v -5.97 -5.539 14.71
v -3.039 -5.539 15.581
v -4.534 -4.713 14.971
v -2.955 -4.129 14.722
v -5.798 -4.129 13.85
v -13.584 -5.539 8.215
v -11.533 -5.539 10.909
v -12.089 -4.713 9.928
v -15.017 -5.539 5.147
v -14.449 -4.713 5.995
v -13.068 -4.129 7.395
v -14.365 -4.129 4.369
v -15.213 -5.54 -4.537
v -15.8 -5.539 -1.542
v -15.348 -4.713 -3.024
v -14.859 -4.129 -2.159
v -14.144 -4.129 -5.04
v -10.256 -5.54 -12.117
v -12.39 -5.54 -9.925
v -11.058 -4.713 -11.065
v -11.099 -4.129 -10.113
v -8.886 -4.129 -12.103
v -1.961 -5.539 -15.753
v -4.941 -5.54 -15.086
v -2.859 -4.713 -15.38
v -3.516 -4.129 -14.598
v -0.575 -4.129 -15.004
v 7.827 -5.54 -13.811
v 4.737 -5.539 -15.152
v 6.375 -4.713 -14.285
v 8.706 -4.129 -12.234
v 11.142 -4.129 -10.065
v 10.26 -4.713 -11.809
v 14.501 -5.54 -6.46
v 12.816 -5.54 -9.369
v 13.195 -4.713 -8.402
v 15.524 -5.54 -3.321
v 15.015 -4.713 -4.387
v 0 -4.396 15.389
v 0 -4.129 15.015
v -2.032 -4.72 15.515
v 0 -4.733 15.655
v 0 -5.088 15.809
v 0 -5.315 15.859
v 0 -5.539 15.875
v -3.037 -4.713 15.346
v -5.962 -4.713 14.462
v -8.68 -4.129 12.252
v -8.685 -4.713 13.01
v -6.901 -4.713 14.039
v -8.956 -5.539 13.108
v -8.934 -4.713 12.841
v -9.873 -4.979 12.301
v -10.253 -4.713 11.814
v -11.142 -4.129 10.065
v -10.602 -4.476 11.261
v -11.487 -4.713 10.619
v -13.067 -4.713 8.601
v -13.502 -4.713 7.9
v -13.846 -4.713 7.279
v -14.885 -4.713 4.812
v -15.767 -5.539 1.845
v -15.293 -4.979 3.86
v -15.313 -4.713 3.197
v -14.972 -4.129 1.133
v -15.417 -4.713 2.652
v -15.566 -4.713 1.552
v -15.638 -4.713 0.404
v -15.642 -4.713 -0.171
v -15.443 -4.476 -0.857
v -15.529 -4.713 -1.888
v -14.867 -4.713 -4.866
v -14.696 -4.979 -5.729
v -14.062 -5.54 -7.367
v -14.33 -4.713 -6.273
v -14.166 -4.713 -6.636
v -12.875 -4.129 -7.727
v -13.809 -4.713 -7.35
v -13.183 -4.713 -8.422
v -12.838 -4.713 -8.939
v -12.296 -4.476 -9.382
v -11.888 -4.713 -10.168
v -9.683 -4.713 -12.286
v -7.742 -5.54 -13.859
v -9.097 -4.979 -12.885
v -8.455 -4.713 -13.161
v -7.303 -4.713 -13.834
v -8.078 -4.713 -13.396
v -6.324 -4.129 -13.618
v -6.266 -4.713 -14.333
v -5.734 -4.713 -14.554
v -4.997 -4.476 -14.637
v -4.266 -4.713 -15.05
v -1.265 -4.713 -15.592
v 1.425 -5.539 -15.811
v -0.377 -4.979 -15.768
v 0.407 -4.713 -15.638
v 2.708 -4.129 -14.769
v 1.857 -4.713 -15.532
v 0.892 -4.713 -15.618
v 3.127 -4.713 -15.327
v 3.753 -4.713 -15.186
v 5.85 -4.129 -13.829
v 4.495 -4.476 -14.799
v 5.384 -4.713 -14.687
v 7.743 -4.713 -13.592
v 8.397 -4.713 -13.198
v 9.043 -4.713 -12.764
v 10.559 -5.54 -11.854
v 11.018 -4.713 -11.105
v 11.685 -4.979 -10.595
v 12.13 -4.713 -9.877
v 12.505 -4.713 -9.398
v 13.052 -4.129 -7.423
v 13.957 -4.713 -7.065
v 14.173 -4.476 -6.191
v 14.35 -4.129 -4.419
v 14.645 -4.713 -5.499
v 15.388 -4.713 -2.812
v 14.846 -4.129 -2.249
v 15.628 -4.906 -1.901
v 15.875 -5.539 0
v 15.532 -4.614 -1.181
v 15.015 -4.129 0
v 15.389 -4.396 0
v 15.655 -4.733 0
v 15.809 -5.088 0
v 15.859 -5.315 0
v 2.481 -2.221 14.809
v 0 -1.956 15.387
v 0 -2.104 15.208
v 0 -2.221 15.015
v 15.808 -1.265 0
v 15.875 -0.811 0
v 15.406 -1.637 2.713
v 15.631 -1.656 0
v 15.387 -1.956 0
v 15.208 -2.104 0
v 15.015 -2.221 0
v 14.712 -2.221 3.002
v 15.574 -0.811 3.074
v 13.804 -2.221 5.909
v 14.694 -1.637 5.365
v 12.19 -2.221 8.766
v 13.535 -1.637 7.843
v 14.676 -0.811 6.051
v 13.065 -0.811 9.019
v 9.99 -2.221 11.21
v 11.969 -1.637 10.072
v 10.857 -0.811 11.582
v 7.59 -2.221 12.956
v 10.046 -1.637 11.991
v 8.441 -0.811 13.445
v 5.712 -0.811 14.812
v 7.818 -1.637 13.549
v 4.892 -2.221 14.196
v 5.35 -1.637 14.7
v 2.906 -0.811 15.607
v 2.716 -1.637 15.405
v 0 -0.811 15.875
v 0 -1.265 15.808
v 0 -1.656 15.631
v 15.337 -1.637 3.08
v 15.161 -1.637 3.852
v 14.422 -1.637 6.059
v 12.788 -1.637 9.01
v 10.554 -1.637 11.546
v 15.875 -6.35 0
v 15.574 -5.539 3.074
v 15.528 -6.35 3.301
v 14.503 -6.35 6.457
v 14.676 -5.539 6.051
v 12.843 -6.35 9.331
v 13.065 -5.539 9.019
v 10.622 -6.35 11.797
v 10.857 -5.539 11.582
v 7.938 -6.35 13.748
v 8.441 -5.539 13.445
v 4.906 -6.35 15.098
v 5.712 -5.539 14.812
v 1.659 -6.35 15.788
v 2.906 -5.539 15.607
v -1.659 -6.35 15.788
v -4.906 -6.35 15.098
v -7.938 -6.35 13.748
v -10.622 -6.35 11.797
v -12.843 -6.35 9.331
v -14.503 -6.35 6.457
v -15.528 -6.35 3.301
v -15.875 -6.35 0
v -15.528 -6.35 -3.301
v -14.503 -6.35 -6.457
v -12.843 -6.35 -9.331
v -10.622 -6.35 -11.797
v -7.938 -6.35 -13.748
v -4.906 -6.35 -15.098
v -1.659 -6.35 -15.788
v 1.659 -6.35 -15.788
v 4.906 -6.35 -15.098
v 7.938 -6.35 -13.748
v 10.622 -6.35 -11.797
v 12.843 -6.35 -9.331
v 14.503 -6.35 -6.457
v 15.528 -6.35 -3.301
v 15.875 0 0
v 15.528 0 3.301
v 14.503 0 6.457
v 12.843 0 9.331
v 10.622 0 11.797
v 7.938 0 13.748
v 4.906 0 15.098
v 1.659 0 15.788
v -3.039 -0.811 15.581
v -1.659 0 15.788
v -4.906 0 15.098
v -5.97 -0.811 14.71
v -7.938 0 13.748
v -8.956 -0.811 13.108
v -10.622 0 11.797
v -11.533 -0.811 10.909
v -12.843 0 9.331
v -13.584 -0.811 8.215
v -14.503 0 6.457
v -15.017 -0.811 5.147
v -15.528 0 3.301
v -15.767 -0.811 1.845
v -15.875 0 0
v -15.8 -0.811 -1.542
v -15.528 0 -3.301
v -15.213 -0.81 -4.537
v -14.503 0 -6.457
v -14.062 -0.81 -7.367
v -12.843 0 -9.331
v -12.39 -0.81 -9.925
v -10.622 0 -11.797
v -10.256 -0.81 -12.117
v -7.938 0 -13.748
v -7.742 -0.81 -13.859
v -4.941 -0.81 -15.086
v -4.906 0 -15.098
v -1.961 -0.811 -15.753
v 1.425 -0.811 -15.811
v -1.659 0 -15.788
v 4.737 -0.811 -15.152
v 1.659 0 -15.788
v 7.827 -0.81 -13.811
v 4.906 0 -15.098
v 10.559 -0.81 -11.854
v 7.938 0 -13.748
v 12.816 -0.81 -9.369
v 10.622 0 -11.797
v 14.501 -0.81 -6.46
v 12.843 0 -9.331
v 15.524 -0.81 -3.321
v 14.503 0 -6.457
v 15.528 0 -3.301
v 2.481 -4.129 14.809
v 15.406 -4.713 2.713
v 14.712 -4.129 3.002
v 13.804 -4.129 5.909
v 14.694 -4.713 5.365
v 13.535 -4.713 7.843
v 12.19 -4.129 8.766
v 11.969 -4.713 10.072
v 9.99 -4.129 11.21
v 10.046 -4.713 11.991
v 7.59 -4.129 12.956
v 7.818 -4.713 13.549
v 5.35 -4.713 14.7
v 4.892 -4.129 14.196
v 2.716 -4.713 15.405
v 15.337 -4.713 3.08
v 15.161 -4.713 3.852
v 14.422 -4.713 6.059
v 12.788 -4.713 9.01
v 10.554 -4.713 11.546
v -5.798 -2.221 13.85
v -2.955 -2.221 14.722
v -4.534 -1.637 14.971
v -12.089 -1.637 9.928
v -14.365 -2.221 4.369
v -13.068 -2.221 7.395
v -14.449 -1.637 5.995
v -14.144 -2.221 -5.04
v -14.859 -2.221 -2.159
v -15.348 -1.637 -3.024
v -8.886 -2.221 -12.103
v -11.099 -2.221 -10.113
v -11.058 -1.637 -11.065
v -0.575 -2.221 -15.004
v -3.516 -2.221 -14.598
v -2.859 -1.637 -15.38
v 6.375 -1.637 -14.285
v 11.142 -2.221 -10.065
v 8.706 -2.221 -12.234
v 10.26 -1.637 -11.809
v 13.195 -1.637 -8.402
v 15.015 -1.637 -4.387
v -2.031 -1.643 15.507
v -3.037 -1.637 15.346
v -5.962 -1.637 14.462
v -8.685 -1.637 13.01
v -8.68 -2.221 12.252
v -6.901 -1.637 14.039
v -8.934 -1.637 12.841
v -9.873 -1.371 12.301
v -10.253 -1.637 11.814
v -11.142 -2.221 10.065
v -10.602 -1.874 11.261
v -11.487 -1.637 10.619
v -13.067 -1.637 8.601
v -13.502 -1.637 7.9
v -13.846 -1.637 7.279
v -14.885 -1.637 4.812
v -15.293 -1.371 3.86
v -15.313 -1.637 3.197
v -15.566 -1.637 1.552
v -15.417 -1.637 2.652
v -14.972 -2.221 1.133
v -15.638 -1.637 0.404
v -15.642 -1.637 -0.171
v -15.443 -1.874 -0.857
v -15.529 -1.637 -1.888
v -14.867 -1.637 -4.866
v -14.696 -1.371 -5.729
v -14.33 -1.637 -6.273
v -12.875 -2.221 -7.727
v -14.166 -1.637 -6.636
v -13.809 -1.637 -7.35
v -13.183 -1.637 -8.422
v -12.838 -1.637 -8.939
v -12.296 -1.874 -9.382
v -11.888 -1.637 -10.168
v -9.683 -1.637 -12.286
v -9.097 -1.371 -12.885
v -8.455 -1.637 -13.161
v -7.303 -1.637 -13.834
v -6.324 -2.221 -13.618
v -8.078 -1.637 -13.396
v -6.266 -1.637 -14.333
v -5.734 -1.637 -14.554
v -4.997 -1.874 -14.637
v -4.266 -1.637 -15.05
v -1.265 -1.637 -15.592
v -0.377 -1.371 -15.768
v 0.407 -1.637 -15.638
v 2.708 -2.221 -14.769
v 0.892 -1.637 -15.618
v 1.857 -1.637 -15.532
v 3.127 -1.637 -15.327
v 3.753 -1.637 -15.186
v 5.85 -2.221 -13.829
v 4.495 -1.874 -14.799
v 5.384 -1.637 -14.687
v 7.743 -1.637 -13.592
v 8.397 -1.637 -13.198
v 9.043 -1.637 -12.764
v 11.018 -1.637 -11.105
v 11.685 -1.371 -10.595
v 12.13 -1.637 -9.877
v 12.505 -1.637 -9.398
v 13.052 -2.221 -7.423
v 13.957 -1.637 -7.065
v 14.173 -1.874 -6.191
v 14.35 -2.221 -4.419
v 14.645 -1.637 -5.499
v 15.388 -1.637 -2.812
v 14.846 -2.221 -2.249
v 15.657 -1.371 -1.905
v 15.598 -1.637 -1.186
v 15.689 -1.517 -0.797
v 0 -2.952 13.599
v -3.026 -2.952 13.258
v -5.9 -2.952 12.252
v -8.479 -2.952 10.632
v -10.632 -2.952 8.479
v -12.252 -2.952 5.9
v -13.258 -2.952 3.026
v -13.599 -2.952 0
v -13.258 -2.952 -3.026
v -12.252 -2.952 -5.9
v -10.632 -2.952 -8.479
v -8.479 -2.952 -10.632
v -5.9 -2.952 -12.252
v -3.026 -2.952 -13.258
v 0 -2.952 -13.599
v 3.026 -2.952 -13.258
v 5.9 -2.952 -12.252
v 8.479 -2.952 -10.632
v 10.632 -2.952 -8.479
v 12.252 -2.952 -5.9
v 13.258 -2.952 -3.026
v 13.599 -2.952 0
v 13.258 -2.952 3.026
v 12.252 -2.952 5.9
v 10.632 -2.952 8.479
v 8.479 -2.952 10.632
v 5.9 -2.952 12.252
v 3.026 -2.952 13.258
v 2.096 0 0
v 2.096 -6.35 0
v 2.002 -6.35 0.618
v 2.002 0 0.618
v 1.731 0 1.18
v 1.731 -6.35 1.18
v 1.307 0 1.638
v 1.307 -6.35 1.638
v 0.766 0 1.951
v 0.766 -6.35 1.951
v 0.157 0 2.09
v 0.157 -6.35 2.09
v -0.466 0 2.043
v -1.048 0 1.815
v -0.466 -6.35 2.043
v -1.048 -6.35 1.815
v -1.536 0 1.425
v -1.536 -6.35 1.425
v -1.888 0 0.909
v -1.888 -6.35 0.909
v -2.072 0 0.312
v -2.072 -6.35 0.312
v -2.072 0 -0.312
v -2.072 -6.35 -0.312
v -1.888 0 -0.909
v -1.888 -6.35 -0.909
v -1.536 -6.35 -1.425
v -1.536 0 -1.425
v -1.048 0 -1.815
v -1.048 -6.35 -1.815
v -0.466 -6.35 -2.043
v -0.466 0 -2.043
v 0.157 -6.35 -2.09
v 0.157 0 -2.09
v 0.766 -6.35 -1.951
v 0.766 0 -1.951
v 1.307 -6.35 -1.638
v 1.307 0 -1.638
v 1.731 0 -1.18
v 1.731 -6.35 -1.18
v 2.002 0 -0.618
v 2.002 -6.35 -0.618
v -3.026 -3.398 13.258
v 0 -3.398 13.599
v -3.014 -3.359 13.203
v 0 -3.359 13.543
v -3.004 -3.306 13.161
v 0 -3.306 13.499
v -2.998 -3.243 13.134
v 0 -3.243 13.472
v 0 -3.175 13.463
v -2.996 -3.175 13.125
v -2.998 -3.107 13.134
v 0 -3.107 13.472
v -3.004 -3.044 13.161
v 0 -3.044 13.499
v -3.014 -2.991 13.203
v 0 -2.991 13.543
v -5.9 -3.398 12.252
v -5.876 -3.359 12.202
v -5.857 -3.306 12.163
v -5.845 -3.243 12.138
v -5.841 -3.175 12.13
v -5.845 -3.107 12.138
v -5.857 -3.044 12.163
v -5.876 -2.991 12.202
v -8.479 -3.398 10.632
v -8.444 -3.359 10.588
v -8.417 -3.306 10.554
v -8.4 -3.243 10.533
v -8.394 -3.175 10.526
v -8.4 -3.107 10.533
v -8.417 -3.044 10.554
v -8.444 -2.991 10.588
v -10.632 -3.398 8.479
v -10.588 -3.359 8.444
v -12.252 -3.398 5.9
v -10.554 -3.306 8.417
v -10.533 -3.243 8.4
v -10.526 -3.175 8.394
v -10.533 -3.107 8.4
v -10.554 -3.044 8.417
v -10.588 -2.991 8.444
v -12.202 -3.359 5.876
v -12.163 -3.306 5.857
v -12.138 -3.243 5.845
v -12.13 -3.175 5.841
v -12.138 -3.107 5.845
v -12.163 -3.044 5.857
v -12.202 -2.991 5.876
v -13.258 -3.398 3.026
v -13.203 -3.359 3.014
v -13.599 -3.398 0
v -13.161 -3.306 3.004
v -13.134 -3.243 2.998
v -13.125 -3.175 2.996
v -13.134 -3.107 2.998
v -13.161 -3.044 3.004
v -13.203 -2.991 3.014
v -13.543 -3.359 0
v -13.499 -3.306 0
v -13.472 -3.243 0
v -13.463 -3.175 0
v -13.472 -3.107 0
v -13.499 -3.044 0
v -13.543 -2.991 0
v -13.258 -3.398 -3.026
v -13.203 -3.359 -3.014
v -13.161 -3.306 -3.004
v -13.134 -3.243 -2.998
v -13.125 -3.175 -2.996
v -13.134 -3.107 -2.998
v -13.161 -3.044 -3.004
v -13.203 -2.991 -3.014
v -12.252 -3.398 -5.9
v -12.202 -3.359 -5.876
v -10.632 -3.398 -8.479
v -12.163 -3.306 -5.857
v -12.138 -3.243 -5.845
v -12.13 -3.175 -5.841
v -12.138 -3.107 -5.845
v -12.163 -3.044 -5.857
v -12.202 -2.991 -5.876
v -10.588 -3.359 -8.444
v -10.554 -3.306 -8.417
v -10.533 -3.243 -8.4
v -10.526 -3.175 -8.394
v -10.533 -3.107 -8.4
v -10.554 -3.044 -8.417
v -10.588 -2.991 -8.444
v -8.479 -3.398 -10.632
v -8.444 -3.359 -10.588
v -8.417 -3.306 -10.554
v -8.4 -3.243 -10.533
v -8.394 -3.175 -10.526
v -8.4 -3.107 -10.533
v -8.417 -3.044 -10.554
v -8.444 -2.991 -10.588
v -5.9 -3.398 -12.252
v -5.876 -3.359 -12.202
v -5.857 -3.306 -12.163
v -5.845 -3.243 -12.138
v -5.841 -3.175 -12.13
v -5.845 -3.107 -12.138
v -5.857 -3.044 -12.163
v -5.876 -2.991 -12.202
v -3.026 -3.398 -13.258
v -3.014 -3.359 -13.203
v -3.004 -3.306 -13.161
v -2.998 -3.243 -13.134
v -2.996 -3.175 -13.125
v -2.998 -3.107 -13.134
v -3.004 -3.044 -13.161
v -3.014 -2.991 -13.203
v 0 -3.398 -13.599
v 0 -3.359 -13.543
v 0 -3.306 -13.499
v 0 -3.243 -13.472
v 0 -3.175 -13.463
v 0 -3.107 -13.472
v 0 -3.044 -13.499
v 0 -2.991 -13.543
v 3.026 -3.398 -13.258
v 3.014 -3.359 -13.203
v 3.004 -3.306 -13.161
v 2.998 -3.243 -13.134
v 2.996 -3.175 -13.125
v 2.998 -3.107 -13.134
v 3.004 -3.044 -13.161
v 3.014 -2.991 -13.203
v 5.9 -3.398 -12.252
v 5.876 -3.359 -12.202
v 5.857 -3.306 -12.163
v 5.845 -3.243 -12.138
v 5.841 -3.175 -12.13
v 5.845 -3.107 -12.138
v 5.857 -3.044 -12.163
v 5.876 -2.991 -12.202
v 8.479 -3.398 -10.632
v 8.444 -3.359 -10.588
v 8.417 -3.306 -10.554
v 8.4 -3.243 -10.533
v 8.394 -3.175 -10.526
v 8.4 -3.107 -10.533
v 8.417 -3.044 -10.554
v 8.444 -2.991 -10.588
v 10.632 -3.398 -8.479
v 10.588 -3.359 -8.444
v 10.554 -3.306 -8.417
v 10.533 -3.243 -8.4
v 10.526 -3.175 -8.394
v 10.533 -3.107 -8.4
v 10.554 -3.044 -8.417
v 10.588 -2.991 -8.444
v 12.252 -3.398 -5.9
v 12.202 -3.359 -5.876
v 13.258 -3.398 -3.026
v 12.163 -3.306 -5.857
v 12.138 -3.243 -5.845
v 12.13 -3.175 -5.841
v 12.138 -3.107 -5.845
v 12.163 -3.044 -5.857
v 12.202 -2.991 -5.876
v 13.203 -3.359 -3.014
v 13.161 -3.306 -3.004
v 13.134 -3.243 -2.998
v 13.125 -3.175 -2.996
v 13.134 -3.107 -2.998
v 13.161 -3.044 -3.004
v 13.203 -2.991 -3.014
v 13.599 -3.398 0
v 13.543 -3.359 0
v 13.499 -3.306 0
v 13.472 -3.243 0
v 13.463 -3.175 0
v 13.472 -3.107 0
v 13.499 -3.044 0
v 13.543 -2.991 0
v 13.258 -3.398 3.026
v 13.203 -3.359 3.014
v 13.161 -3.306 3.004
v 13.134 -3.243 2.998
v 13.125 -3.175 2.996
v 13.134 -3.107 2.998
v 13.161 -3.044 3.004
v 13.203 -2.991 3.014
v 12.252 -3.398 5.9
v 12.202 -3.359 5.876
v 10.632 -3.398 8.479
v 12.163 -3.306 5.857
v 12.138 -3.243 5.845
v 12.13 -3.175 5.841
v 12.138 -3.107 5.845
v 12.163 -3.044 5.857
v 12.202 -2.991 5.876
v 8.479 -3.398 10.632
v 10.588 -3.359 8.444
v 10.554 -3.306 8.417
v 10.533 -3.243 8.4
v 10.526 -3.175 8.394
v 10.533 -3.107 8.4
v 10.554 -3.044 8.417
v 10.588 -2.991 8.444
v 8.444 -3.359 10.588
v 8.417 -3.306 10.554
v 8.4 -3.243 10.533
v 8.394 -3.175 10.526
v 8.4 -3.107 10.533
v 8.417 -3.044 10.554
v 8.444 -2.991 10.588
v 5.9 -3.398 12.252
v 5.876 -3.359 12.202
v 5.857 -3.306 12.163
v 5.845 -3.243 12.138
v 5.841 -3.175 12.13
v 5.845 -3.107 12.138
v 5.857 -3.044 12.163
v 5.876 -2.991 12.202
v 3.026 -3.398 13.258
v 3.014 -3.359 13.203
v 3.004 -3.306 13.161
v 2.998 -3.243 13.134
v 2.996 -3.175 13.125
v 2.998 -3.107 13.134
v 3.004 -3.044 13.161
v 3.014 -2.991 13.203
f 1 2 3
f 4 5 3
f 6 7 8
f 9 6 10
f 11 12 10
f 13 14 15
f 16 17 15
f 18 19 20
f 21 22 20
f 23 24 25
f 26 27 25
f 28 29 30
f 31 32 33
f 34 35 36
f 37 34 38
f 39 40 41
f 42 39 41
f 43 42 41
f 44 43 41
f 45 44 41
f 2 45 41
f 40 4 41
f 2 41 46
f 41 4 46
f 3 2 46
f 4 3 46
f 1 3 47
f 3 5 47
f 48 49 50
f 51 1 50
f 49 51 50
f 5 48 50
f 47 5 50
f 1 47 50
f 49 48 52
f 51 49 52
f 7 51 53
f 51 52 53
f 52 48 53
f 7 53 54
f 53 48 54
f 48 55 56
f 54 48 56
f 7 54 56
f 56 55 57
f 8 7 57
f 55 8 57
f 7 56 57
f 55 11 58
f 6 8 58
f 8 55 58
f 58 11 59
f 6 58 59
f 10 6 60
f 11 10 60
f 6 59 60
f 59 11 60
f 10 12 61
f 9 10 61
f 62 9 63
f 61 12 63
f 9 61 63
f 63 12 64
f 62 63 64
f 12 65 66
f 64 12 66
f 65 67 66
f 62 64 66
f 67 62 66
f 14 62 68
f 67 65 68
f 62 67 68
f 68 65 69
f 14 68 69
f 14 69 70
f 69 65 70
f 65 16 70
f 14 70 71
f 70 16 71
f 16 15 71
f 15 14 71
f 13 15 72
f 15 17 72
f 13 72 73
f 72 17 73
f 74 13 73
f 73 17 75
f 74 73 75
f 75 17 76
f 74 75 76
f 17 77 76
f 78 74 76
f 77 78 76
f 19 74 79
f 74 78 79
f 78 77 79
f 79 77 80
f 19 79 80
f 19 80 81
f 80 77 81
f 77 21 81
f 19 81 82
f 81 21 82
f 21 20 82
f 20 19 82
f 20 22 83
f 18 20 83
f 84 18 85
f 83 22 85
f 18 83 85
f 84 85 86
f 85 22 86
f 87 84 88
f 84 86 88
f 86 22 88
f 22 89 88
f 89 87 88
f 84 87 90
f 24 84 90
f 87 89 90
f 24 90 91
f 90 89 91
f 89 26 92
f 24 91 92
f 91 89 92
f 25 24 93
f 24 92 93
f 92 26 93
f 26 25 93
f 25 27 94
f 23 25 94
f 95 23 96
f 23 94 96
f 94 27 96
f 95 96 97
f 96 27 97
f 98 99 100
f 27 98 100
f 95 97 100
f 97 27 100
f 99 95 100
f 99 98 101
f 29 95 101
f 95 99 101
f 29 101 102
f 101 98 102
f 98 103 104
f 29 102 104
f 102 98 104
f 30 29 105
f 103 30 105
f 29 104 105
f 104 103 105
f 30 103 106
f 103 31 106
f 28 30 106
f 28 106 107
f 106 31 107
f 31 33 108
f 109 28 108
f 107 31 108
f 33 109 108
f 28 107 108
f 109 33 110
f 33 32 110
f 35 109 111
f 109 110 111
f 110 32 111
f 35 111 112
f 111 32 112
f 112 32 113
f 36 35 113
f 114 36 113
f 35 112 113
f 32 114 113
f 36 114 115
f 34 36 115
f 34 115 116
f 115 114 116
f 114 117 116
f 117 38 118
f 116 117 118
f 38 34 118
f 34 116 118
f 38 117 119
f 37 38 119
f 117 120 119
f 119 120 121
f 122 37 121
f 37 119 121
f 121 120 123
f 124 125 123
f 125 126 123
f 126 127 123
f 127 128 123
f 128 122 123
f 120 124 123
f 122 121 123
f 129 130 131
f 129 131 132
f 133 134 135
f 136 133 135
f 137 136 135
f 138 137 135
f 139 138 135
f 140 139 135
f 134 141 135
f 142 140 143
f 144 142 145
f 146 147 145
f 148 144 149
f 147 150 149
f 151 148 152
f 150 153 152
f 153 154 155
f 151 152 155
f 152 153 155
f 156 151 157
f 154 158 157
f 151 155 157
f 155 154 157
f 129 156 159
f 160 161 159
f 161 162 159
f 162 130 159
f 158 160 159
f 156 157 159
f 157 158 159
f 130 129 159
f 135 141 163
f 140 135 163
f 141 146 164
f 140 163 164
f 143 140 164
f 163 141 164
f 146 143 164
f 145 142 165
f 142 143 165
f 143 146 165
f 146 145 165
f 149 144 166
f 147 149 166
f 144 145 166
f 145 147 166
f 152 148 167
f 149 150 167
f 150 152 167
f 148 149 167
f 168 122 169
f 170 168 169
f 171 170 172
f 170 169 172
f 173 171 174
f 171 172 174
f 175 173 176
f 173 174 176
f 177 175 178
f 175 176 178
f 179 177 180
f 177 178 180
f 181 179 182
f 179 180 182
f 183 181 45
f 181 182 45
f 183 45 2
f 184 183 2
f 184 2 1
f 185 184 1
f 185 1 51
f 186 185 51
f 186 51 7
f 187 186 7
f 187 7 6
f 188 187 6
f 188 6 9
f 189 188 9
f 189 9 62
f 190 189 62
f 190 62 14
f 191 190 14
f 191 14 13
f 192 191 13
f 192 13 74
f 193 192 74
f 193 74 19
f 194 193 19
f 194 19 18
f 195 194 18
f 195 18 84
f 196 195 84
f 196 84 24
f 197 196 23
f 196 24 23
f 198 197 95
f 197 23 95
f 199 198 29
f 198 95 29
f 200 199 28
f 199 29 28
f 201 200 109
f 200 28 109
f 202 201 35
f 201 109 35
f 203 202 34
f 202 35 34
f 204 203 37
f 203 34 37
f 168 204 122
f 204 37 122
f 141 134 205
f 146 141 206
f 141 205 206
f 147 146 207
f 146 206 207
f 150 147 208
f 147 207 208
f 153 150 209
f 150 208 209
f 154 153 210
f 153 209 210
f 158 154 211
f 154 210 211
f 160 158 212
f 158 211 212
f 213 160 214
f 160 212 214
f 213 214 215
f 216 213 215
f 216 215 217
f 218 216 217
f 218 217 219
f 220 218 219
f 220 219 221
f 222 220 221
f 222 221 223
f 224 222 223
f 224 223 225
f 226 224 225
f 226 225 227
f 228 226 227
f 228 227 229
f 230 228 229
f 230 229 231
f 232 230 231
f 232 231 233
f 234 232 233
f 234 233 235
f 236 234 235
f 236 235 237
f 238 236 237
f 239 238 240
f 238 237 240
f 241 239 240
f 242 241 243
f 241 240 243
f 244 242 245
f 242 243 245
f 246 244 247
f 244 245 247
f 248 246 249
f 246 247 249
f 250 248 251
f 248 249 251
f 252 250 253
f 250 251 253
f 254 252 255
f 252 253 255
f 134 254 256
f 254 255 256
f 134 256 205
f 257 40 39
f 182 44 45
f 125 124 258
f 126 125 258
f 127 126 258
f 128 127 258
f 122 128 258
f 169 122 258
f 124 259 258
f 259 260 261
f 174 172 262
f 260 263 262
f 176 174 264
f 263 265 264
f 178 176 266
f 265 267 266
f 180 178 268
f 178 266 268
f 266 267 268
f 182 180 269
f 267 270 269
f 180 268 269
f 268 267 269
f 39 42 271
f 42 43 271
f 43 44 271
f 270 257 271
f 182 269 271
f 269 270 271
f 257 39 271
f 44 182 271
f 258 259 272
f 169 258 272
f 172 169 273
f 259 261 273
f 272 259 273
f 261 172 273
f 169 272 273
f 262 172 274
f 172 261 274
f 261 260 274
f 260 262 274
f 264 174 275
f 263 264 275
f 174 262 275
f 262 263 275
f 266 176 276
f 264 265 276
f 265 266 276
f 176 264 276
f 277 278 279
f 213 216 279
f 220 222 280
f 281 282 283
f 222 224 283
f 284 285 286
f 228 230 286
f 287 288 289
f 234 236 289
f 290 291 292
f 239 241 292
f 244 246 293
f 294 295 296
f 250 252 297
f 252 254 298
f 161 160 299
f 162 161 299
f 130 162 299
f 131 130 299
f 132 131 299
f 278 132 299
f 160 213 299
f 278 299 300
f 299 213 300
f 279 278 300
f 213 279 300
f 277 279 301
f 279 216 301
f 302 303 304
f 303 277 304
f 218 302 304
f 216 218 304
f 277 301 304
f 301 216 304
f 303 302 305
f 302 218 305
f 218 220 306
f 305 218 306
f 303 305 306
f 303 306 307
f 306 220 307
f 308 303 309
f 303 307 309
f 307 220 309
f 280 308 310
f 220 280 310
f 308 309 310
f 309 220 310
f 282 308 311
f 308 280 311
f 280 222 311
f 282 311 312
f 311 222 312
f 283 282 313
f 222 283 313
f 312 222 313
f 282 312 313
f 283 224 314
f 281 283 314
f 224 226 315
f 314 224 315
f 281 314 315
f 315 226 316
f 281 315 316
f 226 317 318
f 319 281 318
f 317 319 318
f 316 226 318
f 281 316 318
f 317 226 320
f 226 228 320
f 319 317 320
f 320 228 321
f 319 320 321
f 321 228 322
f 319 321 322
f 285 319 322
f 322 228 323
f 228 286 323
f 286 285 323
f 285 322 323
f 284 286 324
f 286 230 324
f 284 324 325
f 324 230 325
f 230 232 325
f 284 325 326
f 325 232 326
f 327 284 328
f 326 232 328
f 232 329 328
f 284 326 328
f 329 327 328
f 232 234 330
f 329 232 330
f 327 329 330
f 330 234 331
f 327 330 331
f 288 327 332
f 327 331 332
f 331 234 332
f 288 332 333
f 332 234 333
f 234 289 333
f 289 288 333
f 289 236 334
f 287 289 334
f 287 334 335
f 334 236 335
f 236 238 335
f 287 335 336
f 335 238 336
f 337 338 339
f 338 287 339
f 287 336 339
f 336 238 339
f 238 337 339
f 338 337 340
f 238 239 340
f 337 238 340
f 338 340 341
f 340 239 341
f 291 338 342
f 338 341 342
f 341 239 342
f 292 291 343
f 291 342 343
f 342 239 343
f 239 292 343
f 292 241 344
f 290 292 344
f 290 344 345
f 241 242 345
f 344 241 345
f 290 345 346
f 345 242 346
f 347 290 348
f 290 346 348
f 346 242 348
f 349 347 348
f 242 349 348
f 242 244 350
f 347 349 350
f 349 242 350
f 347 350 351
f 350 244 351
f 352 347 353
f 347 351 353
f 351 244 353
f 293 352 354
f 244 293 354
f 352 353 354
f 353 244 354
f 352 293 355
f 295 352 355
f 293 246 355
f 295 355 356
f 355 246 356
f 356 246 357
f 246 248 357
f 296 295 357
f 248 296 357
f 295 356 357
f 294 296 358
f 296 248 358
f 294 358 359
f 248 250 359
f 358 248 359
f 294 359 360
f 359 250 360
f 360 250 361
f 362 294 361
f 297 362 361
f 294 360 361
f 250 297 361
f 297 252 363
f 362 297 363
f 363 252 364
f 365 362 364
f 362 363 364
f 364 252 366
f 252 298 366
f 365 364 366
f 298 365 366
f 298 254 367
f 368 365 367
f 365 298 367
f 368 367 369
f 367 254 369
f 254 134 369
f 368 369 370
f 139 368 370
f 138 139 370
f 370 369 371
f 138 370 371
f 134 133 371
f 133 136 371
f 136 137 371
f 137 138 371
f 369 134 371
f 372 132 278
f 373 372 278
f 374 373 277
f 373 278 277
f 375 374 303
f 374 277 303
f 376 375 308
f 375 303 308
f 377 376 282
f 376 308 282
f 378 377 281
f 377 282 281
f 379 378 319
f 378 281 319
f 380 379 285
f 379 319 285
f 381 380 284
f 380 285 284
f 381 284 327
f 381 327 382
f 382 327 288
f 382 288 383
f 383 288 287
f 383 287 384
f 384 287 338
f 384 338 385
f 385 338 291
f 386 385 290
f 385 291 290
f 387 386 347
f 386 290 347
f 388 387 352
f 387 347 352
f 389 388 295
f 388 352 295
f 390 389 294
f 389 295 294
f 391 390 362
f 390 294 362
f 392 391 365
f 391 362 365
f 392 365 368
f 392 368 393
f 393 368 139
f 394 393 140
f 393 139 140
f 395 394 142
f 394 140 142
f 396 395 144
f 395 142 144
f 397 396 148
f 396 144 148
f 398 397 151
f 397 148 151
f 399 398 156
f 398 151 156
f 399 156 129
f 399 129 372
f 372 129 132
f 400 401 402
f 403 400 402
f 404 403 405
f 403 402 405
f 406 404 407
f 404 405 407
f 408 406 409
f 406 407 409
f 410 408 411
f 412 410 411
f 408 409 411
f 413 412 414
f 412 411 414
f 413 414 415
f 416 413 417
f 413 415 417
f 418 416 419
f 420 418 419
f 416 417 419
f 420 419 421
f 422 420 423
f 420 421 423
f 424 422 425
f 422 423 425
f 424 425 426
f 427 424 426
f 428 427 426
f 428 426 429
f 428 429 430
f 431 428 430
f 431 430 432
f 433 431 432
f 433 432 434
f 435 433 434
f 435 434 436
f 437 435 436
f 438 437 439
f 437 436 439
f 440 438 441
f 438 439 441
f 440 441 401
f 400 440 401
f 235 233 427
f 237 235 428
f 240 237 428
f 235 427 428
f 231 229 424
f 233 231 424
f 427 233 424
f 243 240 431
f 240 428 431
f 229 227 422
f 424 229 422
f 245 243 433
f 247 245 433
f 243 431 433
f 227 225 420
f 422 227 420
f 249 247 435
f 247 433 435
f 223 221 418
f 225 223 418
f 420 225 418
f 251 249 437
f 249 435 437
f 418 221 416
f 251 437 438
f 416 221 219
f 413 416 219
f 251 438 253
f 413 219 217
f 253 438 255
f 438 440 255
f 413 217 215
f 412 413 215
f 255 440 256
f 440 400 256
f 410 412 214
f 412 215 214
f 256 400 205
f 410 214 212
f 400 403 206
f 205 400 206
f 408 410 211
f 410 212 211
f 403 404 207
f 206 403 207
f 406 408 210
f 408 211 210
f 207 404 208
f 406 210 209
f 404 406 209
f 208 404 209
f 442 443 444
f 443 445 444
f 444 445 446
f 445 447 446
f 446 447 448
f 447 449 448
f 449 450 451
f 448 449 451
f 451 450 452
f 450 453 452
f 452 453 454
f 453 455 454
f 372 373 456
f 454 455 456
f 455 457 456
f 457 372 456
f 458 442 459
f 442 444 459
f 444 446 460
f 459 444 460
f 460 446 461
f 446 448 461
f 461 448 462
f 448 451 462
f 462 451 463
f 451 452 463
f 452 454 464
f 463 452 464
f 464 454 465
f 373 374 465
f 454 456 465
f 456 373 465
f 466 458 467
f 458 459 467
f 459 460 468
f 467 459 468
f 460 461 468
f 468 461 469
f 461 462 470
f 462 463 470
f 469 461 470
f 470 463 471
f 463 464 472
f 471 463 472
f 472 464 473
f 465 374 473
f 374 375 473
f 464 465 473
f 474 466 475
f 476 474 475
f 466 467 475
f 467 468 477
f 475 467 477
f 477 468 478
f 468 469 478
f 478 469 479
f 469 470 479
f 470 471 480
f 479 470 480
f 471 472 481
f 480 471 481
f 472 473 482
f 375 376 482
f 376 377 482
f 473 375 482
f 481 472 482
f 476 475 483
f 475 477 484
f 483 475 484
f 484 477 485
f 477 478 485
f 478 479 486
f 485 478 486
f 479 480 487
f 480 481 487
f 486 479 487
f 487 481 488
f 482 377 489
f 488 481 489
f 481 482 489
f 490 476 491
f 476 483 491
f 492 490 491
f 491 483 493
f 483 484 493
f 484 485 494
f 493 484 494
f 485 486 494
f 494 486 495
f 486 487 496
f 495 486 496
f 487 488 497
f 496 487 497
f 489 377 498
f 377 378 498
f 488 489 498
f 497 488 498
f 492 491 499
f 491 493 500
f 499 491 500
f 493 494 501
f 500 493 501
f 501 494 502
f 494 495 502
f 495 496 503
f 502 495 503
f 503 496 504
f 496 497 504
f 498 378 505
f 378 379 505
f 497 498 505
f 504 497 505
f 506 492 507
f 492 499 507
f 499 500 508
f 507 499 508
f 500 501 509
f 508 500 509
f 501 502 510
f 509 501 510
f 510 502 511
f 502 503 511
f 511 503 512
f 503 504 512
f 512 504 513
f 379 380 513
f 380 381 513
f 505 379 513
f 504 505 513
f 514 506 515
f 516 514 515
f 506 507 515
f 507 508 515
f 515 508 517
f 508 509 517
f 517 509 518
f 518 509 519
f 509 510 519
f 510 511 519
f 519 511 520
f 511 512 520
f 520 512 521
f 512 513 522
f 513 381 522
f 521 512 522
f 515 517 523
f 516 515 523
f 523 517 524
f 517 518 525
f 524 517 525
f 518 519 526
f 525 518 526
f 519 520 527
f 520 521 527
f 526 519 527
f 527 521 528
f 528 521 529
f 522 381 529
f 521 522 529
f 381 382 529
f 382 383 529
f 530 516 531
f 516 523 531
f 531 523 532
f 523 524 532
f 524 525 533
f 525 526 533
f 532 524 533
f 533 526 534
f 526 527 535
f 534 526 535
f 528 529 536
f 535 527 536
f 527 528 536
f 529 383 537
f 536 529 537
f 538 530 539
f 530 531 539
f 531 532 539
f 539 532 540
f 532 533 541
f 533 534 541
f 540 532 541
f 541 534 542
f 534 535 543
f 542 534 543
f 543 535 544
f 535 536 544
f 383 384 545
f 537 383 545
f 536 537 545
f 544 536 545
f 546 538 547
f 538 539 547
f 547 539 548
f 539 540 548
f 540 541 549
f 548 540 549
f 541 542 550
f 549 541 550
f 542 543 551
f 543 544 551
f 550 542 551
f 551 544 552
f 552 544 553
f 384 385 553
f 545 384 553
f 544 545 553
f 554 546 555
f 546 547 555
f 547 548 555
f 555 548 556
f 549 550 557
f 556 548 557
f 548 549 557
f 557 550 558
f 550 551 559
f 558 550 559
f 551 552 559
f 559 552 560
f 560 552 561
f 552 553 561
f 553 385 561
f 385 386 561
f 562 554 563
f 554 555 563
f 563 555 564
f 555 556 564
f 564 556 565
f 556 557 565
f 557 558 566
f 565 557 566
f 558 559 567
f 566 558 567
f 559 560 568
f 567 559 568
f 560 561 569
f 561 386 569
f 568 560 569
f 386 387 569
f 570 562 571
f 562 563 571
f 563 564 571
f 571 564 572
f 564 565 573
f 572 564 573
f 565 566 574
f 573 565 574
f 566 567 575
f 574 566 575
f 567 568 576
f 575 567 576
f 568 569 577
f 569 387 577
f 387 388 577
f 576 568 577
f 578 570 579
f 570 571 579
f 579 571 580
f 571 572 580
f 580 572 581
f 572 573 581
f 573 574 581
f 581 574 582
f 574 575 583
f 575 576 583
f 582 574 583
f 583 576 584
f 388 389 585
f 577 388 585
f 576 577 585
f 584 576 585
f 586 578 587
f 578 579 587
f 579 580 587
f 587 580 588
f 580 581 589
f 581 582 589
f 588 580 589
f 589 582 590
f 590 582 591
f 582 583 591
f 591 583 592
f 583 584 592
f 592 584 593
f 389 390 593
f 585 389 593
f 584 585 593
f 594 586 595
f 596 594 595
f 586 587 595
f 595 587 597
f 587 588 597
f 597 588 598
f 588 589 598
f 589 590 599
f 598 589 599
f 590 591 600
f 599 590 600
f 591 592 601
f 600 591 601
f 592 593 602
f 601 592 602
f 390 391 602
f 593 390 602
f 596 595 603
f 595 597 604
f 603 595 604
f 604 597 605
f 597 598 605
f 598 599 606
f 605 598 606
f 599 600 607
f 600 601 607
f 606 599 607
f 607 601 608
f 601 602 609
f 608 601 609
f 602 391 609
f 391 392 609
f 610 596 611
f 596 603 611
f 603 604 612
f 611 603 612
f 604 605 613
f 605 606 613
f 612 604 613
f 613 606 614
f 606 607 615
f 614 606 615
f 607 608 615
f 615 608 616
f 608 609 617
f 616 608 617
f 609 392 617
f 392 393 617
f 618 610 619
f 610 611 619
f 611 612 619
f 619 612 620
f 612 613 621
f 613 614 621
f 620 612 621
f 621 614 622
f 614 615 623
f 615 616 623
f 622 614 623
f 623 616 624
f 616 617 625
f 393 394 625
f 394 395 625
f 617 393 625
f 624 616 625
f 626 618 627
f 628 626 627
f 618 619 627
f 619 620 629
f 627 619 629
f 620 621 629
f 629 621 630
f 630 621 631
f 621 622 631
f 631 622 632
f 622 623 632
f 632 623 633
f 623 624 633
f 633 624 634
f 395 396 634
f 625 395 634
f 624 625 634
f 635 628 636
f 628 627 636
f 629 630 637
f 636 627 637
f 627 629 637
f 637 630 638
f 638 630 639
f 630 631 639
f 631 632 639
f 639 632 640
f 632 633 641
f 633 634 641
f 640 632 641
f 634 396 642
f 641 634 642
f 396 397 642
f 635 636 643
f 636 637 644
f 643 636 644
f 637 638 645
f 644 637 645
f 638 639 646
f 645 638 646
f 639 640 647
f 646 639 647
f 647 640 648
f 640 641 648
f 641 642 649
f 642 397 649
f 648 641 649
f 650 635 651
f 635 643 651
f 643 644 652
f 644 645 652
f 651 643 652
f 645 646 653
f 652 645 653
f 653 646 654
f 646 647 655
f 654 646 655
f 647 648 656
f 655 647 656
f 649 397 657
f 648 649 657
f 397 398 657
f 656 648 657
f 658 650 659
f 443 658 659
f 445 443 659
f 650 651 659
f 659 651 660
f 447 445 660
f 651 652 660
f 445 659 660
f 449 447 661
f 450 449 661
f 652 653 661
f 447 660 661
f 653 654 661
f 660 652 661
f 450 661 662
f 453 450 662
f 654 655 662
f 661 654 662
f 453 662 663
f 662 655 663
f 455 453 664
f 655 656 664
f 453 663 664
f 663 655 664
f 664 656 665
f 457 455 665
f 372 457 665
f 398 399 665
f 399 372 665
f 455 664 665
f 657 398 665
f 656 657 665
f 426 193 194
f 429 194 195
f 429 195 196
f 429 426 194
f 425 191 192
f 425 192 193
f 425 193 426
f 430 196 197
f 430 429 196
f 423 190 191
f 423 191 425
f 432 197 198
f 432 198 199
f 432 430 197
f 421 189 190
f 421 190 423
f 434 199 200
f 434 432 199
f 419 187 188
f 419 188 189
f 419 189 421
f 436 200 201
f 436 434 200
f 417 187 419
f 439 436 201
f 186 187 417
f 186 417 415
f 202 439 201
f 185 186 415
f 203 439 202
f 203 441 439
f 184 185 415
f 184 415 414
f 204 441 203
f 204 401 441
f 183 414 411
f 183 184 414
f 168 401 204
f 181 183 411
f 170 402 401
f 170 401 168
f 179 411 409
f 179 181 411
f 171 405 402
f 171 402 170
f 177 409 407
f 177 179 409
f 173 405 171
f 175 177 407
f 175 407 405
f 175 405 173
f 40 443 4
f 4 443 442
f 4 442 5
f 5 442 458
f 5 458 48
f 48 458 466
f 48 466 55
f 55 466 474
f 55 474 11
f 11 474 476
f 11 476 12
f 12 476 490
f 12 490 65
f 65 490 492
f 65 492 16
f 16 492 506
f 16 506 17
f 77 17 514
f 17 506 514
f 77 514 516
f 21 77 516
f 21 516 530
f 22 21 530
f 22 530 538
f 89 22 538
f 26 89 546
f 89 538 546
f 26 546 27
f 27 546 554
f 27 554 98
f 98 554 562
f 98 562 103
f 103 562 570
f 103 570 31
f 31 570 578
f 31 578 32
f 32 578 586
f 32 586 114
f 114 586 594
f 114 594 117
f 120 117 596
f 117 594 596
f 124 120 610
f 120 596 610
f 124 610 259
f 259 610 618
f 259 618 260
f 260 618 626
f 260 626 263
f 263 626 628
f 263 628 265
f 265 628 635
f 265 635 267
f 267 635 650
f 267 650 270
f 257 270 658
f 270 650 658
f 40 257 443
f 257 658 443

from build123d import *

# Parameters (mm, degrees)
F0_R     = 15.875
F1_DEPTH = 6.35
F2_R     = 2.0955
F3_DEPTH = 6.35
F7_R     = 1.5875


with BuildPart() as f1:
    # F0 (on Front) → F1 (new body)
    with BuildSketch(Plane.XZ):
        Circle(F0_R)
    extrude(amount=F1_DEPTH)

    # F2 (on face) → F3 (cut)
    with BuildSketch(Plane.XZ.offset(6.35)):
        Circle(F2_R)
    extrude(amount=-F3_DEPTH, mode=Mode.SUBTRACT)

    # F4 (on Right) → F6 (revolve, cut)
    with BuildSketch(Plane.YZ):
        with BuildLine():
            Line((-1.778, 15.875), (-4.572, 15.875))
            Line((-4.572, 15.875), (-3.397973, 13.598685))
            ThreePointArc((-3.397973, 13.598685), (-3.175, 13.462803), (-2.952027, 13.598685))
            Line((-2.952027, 13.598685), (-1.778, 15.875))
        make_face()
    revolve(axis=Axis((0, -3.17588, 0), (0, -1, 0)), mode=Mode.SUBTRACT)

    # F7
    f7_edges = [f1.edges().sort_by_distance(p)[0] for p in [
        (-11.22532, -4.572, -11.22532),
        (-11.22532, -1.778, -11.22532),
    ]]
    fillet(f7_edges, radius=F7_R)


solid = f1.part
